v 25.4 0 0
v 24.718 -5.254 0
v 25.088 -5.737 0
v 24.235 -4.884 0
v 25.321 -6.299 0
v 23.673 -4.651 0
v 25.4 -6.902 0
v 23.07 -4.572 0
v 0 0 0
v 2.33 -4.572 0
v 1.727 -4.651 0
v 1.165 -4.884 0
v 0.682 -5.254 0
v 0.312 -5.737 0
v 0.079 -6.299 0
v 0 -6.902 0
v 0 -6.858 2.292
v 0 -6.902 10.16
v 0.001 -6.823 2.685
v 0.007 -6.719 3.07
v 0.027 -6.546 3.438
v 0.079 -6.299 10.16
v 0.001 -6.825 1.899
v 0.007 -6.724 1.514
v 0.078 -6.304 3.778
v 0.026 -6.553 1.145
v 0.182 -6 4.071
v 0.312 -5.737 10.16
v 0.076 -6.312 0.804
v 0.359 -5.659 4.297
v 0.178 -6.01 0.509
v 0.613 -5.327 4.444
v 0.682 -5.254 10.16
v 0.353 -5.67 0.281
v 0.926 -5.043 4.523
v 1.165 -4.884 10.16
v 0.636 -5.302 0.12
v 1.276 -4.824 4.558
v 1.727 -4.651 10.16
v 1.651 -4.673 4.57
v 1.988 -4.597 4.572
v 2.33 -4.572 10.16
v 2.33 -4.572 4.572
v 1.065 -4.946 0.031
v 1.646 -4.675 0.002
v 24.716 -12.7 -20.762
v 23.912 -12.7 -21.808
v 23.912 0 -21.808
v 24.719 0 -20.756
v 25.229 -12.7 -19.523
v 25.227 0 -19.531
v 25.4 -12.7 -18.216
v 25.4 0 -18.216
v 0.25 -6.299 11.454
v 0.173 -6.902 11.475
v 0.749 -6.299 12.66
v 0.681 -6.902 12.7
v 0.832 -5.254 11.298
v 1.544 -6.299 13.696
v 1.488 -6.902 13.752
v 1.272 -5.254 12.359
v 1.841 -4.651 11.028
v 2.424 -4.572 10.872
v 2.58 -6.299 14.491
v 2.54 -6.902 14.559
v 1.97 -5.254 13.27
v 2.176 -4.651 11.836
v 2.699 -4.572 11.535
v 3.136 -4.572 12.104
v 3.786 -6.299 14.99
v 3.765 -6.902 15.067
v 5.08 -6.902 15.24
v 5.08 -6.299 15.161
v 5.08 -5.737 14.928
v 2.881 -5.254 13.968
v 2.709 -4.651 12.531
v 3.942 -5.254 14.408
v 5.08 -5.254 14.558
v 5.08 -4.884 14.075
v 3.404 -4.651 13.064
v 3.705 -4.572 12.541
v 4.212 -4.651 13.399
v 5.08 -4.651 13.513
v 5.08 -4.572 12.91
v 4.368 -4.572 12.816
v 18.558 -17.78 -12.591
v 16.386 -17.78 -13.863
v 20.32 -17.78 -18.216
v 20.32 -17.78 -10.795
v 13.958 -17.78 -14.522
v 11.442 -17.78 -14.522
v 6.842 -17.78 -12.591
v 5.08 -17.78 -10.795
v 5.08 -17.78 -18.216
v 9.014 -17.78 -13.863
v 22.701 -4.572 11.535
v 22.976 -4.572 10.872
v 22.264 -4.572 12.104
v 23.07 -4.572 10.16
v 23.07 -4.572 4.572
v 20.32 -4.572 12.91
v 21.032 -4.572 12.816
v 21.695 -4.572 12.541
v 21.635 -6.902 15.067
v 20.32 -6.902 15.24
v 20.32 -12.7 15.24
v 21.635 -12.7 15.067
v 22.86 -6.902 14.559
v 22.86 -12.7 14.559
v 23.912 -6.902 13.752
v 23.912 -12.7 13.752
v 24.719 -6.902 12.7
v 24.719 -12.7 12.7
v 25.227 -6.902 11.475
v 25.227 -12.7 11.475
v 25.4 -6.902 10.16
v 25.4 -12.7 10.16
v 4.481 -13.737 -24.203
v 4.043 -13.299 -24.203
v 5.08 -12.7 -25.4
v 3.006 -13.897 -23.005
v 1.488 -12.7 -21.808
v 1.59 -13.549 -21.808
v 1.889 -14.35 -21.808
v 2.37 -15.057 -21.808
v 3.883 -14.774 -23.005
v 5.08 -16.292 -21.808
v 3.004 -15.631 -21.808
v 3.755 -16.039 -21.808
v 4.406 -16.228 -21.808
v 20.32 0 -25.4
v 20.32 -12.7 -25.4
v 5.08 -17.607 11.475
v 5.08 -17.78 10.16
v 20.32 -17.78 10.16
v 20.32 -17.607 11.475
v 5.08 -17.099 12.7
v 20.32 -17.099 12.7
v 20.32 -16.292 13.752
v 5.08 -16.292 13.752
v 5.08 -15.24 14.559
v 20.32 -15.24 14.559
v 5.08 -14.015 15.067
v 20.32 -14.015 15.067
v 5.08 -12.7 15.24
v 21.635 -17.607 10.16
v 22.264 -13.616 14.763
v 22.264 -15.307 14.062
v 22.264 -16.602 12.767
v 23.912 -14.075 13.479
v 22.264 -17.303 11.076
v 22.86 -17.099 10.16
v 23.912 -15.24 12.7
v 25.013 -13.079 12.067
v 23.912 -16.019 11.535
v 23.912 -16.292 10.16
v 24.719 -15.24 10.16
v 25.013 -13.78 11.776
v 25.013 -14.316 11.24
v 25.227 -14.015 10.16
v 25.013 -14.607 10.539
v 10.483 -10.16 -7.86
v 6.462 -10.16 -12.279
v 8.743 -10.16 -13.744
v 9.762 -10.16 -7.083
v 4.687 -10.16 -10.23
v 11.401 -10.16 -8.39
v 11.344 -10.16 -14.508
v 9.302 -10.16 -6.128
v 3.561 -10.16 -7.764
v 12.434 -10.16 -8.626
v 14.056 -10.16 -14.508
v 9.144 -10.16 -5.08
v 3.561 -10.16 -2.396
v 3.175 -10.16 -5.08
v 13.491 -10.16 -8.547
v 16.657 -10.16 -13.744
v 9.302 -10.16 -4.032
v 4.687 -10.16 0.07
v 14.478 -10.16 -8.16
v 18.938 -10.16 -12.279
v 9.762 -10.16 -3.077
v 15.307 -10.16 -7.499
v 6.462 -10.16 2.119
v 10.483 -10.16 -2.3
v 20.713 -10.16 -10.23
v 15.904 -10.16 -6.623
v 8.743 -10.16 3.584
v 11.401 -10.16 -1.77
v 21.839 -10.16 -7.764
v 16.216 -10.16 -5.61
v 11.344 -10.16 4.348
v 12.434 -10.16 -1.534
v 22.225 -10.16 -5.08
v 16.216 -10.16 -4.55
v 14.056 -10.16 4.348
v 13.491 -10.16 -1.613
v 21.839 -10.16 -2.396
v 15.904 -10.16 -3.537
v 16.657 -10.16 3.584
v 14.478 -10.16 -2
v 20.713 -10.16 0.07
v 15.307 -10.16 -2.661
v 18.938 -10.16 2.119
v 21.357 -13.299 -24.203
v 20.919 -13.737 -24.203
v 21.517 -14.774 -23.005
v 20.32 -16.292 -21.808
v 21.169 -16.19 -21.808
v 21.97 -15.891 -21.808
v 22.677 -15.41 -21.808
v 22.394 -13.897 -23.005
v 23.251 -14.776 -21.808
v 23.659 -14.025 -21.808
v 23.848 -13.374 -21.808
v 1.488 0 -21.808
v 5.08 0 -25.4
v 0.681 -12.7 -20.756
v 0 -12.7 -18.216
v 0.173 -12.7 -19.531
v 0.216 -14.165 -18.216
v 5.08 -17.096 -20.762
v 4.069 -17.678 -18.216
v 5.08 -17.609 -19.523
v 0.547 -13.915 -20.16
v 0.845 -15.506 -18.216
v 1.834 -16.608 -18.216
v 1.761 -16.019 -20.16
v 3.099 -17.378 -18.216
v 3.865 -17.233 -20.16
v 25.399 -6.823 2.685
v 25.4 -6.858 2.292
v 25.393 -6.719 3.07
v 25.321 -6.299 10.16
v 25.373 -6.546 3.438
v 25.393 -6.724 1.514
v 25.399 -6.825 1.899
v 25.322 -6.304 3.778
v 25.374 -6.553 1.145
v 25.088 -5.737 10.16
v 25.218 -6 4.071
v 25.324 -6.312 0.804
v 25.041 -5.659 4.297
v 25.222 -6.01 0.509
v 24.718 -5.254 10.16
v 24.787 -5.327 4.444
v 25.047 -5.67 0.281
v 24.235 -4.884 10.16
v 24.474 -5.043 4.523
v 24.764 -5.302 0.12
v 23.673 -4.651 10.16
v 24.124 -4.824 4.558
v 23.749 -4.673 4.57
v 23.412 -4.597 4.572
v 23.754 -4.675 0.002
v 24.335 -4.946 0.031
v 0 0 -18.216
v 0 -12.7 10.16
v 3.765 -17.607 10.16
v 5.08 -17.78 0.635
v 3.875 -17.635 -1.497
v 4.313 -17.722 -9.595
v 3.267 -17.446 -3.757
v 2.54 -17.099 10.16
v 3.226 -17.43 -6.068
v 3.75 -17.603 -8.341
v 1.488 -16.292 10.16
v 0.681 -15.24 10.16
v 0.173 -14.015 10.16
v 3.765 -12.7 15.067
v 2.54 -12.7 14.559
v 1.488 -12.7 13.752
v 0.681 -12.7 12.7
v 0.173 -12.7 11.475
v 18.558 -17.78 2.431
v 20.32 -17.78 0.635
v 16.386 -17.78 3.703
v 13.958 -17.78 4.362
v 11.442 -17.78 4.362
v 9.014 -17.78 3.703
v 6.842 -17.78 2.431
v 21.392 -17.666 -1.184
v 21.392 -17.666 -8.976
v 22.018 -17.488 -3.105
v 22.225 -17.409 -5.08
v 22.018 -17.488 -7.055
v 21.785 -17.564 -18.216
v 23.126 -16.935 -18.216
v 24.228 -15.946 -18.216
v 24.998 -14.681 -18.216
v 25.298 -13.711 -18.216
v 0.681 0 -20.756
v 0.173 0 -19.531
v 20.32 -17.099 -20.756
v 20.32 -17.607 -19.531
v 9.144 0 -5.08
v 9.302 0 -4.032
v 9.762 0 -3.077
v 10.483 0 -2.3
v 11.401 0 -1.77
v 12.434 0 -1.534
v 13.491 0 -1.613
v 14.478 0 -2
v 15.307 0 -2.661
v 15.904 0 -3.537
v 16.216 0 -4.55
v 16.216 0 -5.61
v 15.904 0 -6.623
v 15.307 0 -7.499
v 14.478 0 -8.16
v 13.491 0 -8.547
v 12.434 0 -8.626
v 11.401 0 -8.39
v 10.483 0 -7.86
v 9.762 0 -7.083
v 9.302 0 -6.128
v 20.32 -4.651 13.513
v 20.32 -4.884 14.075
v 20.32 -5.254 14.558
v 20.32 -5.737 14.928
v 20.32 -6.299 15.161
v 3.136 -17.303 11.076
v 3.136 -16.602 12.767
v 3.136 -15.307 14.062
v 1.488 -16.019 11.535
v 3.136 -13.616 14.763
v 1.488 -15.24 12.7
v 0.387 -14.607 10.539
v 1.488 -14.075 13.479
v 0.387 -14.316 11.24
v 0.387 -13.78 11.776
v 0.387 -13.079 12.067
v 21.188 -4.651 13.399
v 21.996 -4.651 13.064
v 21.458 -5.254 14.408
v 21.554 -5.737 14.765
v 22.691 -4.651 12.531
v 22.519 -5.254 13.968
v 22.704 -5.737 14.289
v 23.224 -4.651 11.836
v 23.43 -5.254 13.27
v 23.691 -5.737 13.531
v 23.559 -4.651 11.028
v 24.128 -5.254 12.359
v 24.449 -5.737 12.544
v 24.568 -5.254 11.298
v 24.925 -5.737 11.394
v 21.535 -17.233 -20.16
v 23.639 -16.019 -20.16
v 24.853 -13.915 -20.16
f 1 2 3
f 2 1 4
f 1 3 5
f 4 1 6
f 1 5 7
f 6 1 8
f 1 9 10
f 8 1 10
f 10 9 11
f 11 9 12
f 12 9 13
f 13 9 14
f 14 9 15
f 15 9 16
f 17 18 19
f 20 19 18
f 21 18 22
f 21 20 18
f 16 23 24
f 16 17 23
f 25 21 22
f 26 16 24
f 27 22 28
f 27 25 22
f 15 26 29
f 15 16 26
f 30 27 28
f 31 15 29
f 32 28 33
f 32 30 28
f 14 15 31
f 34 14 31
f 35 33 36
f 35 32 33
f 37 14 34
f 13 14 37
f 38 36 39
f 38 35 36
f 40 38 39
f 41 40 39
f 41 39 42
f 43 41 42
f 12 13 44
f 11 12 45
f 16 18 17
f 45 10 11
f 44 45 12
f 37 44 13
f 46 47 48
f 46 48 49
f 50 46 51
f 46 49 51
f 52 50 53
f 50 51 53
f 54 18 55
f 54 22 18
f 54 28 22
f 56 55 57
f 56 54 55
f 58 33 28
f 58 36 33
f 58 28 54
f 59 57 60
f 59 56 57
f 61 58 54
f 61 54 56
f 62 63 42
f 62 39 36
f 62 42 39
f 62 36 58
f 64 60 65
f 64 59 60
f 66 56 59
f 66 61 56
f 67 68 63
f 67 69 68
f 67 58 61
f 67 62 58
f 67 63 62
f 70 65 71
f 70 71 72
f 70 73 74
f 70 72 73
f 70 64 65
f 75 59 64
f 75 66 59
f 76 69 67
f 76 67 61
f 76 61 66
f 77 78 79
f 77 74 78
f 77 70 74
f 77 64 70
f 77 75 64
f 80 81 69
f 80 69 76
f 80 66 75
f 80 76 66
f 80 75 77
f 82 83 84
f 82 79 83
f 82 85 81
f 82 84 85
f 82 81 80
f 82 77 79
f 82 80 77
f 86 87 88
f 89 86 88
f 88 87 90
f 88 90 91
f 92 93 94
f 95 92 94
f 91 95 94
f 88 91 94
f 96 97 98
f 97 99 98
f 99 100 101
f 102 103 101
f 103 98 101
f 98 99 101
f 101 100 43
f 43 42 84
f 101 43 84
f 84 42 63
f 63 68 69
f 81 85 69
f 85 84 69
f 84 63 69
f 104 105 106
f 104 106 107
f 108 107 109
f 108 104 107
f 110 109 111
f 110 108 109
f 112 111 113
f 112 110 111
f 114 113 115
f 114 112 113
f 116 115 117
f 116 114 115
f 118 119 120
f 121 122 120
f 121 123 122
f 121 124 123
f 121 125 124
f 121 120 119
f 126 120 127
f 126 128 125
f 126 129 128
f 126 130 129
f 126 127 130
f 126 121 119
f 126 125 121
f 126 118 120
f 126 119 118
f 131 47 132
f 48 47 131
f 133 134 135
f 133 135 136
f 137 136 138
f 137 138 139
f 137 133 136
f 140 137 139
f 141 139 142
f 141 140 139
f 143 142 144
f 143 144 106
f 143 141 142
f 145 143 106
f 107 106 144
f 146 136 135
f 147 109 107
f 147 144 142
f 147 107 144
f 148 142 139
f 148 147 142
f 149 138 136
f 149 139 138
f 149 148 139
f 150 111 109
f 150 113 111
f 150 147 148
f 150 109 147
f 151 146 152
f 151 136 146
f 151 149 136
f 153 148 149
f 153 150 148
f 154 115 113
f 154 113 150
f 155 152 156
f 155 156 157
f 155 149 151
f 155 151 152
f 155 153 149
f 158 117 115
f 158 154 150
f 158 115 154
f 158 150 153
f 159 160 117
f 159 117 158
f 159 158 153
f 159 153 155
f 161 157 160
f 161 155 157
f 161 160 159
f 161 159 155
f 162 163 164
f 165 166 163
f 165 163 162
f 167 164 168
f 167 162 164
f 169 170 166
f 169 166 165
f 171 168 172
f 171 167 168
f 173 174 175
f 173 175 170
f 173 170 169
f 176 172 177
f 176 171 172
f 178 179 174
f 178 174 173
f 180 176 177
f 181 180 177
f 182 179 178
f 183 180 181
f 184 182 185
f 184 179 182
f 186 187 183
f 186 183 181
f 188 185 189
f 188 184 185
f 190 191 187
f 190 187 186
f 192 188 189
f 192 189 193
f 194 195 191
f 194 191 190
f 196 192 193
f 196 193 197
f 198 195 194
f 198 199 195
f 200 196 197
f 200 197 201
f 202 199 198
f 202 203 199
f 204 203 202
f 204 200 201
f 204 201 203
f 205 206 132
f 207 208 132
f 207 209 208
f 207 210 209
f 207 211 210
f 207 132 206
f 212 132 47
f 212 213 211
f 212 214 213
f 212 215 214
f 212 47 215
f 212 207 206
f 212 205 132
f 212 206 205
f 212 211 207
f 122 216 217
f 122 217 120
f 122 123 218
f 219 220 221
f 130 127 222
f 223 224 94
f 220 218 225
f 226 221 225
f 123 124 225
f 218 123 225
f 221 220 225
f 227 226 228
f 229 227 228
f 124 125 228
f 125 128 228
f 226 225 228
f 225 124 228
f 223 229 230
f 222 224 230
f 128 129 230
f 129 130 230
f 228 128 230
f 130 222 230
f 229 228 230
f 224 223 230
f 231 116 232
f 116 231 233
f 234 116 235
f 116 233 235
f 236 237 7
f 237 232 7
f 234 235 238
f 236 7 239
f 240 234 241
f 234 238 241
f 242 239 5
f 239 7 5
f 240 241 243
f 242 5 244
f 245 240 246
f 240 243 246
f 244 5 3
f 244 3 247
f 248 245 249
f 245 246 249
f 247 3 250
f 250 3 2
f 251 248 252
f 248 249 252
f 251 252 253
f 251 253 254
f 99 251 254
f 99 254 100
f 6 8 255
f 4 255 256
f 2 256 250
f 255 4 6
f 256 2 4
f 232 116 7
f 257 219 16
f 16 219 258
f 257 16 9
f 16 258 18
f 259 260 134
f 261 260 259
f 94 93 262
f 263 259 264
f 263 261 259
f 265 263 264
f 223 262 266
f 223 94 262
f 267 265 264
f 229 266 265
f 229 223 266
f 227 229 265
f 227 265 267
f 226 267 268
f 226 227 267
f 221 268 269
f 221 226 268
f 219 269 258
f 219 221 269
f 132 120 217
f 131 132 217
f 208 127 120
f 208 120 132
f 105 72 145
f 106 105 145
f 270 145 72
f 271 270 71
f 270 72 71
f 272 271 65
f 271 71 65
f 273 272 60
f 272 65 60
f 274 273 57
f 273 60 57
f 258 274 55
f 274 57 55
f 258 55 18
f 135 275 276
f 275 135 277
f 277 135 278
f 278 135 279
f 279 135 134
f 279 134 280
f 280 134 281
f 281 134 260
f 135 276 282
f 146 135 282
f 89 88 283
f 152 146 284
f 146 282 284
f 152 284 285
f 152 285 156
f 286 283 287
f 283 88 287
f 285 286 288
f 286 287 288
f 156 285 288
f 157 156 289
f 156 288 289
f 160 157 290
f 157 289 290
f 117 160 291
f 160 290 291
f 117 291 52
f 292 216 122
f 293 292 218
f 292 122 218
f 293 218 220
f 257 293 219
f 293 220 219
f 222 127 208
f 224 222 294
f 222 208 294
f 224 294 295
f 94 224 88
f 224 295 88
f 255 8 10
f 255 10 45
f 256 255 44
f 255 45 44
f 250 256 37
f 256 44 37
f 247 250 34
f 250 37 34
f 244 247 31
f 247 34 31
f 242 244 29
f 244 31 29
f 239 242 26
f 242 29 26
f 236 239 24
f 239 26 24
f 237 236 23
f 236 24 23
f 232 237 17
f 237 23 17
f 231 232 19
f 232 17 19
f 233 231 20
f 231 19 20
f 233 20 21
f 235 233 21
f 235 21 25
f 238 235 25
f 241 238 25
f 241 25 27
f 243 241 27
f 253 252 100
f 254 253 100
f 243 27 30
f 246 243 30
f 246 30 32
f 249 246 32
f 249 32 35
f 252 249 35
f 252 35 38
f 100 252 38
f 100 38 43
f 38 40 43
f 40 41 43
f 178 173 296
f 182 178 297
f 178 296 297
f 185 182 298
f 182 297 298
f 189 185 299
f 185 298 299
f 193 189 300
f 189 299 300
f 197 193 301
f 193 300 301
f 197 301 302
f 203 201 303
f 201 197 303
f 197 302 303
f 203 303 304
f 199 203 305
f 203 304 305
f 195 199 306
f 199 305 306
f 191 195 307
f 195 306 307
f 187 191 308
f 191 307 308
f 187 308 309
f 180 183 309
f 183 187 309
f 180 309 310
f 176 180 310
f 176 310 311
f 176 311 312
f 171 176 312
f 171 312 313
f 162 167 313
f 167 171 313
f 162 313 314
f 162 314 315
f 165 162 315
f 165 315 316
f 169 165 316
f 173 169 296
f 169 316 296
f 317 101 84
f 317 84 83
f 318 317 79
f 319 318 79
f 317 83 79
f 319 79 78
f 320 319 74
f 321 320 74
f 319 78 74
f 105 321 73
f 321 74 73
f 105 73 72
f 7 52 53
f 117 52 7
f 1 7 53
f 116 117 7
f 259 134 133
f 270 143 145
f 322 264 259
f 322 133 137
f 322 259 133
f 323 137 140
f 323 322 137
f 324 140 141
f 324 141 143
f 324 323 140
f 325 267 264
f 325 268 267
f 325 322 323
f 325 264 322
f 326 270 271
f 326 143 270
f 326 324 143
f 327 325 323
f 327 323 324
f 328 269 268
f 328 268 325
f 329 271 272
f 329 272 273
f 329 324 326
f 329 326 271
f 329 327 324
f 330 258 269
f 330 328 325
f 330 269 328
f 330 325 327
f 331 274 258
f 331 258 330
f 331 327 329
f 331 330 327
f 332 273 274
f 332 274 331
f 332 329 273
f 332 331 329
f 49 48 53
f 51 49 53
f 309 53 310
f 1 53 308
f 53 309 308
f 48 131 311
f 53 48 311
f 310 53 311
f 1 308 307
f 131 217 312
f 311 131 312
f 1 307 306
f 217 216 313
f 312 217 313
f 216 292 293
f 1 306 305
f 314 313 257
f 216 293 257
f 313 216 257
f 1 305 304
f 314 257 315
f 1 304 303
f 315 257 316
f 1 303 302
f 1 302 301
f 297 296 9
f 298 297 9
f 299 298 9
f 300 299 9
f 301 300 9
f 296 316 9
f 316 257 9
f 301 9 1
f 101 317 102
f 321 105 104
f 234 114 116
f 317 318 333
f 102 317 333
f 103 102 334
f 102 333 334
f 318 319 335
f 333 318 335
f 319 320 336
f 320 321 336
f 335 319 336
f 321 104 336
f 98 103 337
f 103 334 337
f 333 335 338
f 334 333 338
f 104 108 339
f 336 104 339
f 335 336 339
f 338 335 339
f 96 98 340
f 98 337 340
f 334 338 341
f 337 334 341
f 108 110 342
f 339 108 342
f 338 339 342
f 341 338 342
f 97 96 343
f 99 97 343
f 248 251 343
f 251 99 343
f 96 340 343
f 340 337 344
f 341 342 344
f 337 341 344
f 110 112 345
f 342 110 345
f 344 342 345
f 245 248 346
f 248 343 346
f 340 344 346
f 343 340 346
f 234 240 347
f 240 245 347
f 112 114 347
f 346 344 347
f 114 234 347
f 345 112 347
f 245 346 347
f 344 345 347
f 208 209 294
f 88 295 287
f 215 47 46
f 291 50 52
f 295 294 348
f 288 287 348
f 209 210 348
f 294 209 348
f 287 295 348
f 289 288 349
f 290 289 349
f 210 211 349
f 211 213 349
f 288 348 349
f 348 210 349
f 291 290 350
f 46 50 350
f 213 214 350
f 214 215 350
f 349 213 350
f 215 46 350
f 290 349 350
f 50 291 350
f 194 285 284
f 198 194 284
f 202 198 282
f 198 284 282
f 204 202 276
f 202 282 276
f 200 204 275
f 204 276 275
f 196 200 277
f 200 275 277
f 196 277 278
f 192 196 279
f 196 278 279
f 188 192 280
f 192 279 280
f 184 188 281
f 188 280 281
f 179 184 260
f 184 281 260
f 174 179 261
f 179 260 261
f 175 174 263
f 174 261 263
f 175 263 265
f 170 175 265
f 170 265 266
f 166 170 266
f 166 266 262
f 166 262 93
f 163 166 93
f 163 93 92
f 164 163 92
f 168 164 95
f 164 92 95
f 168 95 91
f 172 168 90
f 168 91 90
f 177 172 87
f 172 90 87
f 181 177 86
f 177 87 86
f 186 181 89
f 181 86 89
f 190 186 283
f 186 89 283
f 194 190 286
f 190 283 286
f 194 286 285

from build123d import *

# Parameters (mm, degrees)
F1_DEPTH     = 25.4
F2_R         = 3.556
F3_DEPTH     = 17.78
F4_R         = 9.525
F4_R_2       = 3.556
F5_DEPTH     = 7.62
F6_T1_DEPTH  = 48.26
F6_T3_DEPTH  = 20.828
F6_T5_DEPTH  = 15.24
F6_S9_W      = 5.08
F6_S9_H      = 5.08
F6_T10_DEPTH = 5.08
F6_S15_W     = 5.08
F6_S15_H     = 5.08
F6_T16_DEPTH = 5.08
F7_SIZE      = 5.07999
F8_R         = 5.08
F9_T3_DEPTH  = 15.24
F9_T6_DEPTH  = 11.413497326
F9_T10_DEPTH = 11.413497326
F9_T14_ANGLE = 89.9999999979
F9_T17_ANGLE = 89.9999999979


# Not quite as in the source:
# - a fillet or chamfer that OpenCascade refuses, or shapes differently, is made with other operations: its cross-section is extruded or revolved along the edge and cut away or added
# - a fillet or chamfer is up to 0.001 mm smaller than in the source, because OpenCascade refuses the exact size


with BuildPart() as f1:
    # F0 (on Right) → F1 (new body)
    with BuildSketch(Plane.YZ):
        with BuildLine():
            Line((0, -25.4), (0, 0))
            Line((0, 0), (-4.572, 0))
            ThreePointArc((-4.572, 0), (-6.858, 2.286), (-4.572, 4.572))
            Line((-4.572, 4.572), (-4.572, 15.24))
            Line((-4.572, 15.24), (-17.78, 15.24))
            Line((-17.78, 15.24), (-17.78, 0))
            Line((-17.78, 0), (-17.78, -25.4))
            Line((-17.78, -25.4), (0, -25.4))
        make_face()
    extrude(amount=F1_DEPTH)

    # F2 (on face) → F3 (cut, through all)
    with BuildSketch(Plane(origin=(0, 0, 0), x_dir=(-1, 0, 0), z_dir=(0, 1, 0))):
        with Locations((-12.7, -5.08)):
            Circle(F2_R)
    extrude(amount=-F3_DEPTH, mode=Mode.SUBTRACT)

    # F4 (on face) → F5 (cut)
    with BuildSketch(Plane.XZ.offset(17.78)):
        with Locations((12.7, -5.08)):
            Circle(F4_R)
        with Locations((12.7, -5.08)):
            Circle(F4_R_2, mode=Mode.SUBTRACT)
    extrude(amount=-F5_DEPTH, mode=Mode.SUBTRACT)

    # F6: fillet of radius 5.08 on 5 edges, made by hand

    # F6_s2 → F6_t1 (cut)
    with BuildSketch(Plane.XY.offset(-38.1)):
        with BuildLine():
            ThreePointArc((5.08, -17.78), (1.4878975516, -16.2921024484), (0, -12.7))
            Line((0, -12.7), (0, -17.78))
            Line((0, -17.78), (5.08, -17.78))
        make_face()
        with BuildLine():
            ThreePointArc((20.32, -17.78), (23.9121024484, -16.2921024484), (25.4, -12.7))
            Line((25.4, -12.7), (25.4, -17.78))
            Line((25.4, -17.78), (20.32, -17.78))
        make_face()
    extrude(amount=F6_T1_DEPTH, mode=Mode.SUBTRACT)

    # F6_s4 → F6_t3 (cut)
    with BuildSketch(Plane.XZ.offset(-8.128)):
        with BuildLine():
            ThreePointArc((20.32, 15.24), (23.9121024484, 13.7521024484), (25.4, 10.16))
            Line((25.4, 10.16), (25.4, 15.24))
            Line((25.4, 15.24), (20.32, 15.24))
        make_face()
        with BuildLine():
            ThreePointArc((5.08, 15.24), (1.4878975516, 13.7521024484), (0, 10.16))
            Line((0, 10.16), (0, 15.24))
            Line((0, 15.24), (5.08, 15.24))
        make_face()
    extrude(amount=F6_T3_DEPTH, mode=Mode.SUBTRACT)

    # F6_s6 → F6_t5 (cut)
    with BuildSketch(Plane.YZ.offset(5.08)):
        with BuildLine():
            ThreePointArc((-17.78, 10.16), (-16.2921024484, 13.7521024484), (-12.7, 15.24))
            Line((-12.7, 15.24), (-17.78, 15.24))
            Line((-17.78, 15.24), (-17.78, 10.16))
        make_face()
    extrude(amount=F6_T5_DEPTH, mode=Mode.SUBTRACT)


with BuildPart() as f6_tool8:
    # F6_s9 → F6_t10 (new body)
    with BuildSketch(Plane.YZ.offset(5.08)):
        with Locations((-15.24, 12.7)):
            Rectangle(F6_S9_W, F6_S9_H)
    extrude(amount=-F6_T10_DEPTH)

    # F6_s11 → F6_t12 (revolve, cut)
    with BuildSketch(Plane(origin=(5.08, -12.7, 10.16), x_dir=(0, 0.7071067812, -0.7071067812), z_dir=(0, 0.7071067812, 0.7071067812))):
        with BuildLine():
            ThreePointArc((0, -5.08), (5.08, 0), (0, 5.08))
            Line((0, 5.08), (0, -5.08))
        make_face()
    revolve(axis=Axis((5.08, -12.7, 10.16), (-1, 0, 0)), mode=Mode.SUBTRACT)


with BuildPart() as f1_1:
    add(f1.part)

    # F6_t7: cut F6_tool8
    add(f6_tool8.part, mode=Mode.SUBTRACT)


with BuildPart() as f6_tool14:
    # F6_s15 → F6_t16 (new body)
    with BuildSketch(Plane.YZ.offset(20.32)):
        with Locations((-15.24, 12.7)):
            Rectangle(F6_S15_W, F6_S15_H)
    extrude(amount=F6_T16_DEPTH)

    # F6_s17 → F6_t18 (revolve, cut)
    with BuildSketch(Plane(origin=(20.32, -12.7, 10.16), x_dir=(0, 0.7071067812, -0.7071067812), z_dir=(0, -0.7071067812, -0.7071067812))):
        with BuildLine():
            ThreePointArc((0, -5.08), (5.08, 0), (0, 5.08))
            Line((0, 5.08), (0, -5.08))
        make_face()
    revolve(axis=Axis((20.32, -12.7, 10.16), (1, 0, 0)), mode=Mode.SUBTRACT)


with BuildPart() as f1_2:
    add(f1_1.part)

    # F6_t13: cut F6_tool14
    add(f6_tool14.part, mode=Mode.SUBTRACT)

    # F7 (size 5.08 in the source; OpenCascade refuses exactly that, so slightly less here)
    f7_edges = [f1_2.edges().sort_by_distance(p)[0] for p in [
        (12.7, -17.78, -25.4),
    ]]
    chamfer(f7_edges, length=F7_SIZE)

    # F8
    f8_edges = [f1_2.edges().sort_by_distance(p)[0] for p in [
        (12.7, -17.78, -20.32001),
        (0, -6.35, -20.32001),
        (25.4, -6.35, -20.32001),
        (1.487898, -16.292102, -20.32001),
        (23.912102, -16.292102, -20.32001),
    ]]
    fillet(f8_edges, radius=F8_R)

    # F9: fillet of radius 2.3301989304 on 5 edges, made by hand


with BuildPart() as f9_tool1:
    # F9_s2 → F9_t3 (new body)
    with BuildSketch(Plane.YZ.offset(5.08)):
        with BuildLine():
            ThreePointArc((-4.572, 12.9098010696), (-5.2544994652, 14.5575005348), (-6.9021989304, 15.24))
            Line((-6.9021989304, 15.24), (-4.572, 15.24))
            Line((-4.572, 15.24), (-4.572, 12.9098010696))
        make_face()
    extrude(amount=F9_T3_DEPTH)


with BuildPart() as f9_tool4:
    # F9_s5 → F9_t6 (new body)
    with BuildSketch(Plane.XY.offset(-1.253497326)):
        with BuildLine():
            ThreePointArc((0, -6.9021989304), (0.6824994652, -5.2544994652), (2.3301989304, -4.572))
            Line((2.3301989304, -4.572), (0, -4.572))
            Line((0, -4.572), (0, -6.9021989304))
        make_face()
    extrude(amount=F9_T6_DEPTH)

    split(bisect_by=Plane.XY, keep=Keep.TOP)


with BuildPart() as f9_tool8:
    # F9_s9 → F9_t10 (new body)
    with BuildSketch(Plane.XY.offset(-1.253497326)):
        with BuildLine():
            ThreePointArc((25.4, -6.9021989304), (24.7175005348, -5.2544994652), (23.0698010696, -4.572))
            Line((23.0698010696, -4.572), (25.4, -4.572))
            Line((25.4, -4.572), (25.4, -6.9021989304))
        make_face()
    extrude(amount=F9_T10_DEPTH)

    split(bisect_by=Plane.XY, keep=Keep.TOP)


with BuildPart() as f9_tool12:
    # F9_s13 → F9_t14 (revolve)
    with BuildSketch(Plane.XY.offset(10.1599999999)):
        with BuildLine():
            ThreePointArc((0, -6.9021989304), (0.6824994652, -5.2544994652), (2.3301989304, -4.572))
            Line((2.3301989304, -4.572), (0, -4.572))
            Line((0, -4.572), (0, -6.9021989304))
        make_face()
    revolve(axis=Axis((5.0800000001, -4.572, 10.1599999999), (0, 1, 0)), revolution_arc=F9_T14_ANGLE)


with BuildPart() as f9_tool15:
    # F9_s16 → F9_t17 (revolve)
    with BuildSketch(Plane.YZ.offset(20.3199999999)):
        with BuildLine():
            ThreePointArc((-4.572, 12.9098010696), (-5.2544994652, 14.5575005348), (-6.9021989304, 15.24))
            Line((-6.9021989304, 15.24), (-4.572, 15.24))
            Line((-4.572, 15.24), (-4.572, 12.9098010696))
        make_face()
    revolve(axis=Axis((20.3199999999, -4.572, 10.1599999999), (0, 1, 0)), revolution_arc=F9_T17_ANGLE)


with BuildPart() as f1_3:
    add(f1_2.part)

    # F9_t18: cut F9_tool1, F9_tool4, F9_tool8, F9_tool12, F9_tool15
    add([f9_tool1.part, f9_tool4.part, f9_tool8.part, f9_tool12.part, f9_tool15.part], mode=Mode.SUBTRACT)


solid = f1_3.part
